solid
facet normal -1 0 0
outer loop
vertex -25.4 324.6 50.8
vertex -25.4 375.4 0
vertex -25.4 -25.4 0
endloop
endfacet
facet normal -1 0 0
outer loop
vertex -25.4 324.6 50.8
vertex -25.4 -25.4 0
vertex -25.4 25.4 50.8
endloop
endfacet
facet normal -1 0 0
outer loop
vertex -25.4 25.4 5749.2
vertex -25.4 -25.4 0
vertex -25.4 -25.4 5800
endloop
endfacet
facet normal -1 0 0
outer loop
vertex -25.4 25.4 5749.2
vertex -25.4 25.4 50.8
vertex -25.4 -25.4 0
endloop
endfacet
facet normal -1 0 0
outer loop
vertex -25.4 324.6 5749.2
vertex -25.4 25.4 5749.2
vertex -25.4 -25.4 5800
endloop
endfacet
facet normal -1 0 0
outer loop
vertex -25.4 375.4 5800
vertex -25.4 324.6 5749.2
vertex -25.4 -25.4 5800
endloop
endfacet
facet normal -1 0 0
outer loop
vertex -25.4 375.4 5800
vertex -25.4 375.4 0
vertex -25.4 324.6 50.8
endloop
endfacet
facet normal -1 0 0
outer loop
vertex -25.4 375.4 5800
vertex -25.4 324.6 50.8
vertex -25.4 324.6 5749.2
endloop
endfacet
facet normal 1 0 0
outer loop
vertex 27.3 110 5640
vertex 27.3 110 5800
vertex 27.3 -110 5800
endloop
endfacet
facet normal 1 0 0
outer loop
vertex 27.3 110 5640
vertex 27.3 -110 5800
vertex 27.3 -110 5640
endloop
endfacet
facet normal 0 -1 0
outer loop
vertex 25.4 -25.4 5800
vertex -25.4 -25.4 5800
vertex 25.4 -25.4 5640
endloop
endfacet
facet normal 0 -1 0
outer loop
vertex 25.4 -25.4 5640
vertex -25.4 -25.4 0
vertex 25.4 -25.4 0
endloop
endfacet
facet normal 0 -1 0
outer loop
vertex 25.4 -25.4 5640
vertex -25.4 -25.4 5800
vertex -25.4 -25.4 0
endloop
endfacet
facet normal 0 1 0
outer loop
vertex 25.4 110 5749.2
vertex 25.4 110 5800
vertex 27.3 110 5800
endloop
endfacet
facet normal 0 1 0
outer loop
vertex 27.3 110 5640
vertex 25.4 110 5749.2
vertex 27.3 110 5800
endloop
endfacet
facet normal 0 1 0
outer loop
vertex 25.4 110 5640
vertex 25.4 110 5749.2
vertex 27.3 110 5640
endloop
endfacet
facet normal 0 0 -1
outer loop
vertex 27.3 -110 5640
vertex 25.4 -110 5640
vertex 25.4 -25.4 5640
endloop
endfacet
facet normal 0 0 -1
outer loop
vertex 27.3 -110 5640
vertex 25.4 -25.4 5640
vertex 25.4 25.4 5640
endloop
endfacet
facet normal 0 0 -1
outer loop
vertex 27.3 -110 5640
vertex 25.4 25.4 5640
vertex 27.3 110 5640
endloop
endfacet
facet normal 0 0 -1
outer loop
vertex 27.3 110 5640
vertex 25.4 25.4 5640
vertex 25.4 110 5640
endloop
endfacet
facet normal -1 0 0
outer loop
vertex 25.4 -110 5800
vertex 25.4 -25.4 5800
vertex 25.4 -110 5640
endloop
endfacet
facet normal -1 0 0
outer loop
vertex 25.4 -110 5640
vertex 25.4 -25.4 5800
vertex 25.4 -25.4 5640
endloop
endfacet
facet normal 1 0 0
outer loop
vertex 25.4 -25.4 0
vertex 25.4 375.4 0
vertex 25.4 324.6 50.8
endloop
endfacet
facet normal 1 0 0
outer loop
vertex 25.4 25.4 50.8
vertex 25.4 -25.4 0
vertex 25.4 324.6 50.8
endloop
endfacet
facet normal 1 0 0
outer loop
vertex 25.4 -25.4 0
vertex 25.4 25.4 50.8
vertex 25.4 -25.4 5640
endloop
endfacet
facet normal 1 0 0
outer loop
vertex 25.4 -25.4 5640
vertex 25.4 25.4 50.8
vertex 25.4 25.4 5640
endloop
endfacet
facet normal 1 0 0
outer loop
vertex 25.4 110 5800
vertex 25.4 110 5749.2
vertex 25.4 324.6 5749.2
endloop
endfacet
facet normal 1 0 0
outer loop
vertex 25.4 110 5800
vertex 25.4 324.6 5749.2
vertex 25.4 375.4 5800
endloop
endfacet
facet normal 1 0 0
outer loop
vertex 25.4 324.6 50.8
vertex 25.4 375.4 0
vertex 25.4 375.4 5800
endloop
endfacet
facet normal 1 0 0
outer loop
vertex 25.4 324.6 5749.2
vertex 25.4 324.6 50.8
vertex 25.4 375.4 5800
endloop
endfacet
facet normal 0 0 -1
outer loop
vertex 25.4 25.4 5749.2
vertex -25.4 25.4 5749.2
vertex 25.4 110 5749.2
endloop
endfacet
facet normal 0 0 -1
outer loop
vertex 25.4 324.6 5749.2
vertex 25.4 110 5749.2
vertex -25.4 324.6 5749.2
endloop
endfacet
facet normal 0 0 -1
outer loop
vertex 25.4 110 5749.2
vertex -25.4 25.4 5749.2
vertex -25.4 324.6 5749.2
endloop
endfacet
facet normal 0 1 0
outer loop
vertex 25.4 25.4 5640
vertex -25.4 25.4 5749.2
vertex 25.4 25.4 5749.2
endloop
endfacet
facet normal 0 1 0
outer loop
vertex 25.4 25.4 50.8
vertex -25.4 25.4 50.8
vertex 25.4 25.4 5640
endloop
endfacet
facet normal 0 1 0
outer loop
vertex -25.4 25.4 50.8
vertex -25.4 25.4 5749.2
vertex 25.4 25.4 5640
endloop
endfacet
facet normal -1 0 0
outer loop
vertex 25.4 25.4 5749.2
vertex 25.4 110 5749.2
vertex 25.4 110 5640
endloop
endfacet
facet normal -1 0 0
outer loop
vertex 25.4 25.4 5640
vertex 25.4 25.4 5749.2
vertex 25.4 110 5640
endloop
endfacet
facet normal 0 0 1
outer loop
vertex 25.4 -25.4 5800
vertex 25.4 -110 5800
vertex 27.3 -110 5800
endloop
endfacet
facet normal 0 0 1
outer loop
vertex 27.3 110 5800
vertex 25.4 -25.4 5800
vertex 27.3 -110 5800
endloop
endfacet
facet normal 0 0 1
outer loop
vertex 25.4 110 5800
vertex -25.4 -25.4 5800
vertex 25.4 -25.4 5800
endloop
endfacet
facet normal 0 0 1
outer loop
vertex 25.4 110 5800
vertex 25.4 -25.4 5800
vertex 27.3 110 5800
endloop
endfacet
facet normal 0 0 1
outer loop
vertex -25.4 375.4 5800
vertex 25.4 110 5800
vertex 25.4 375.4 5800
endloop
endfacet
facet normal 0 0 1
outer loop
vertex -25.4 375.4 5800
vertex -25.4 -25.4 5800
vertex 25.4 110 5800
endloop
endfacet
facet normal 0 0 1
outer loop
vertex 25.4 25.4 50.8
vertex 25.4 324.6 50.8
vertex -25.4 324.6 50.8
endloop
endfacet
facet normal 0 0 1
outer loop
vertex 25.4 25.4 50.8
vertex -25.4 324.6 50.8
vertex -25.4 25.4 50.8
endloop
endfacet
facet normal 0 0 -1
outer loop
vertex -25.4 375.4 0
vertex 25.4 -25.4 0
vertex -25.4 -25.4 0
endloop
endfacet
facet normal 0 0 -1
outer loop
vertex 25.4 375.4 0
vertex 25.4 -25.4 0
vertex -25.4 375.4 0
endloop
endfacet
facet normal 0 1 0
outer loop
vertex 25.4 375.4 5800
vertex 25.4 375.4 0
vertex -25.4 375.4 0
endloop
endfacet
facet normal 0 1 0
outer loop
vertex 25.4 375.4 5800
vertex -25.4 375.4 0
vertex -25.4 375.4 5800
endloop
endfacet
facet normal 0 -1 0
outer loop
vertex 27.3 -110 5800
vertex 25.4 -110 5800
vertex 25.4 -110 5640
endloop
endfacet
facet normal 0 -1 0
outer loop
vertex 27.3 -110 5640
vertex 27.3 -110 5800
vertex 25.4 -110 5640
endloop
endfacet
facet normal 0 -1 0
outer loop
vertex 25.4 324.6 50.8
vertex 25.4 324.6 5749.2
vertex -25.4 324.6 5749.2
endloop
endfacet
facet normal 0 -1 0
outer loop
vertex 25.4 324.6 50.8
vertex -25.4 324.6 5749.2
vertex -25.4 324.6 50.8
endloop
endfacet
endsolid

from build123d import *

# Parameters (mm, degrees)
CROQUIS1_W              = 50.8
CROQUIS1_H              = 50.8
SALIENTE_EXTRUIR1_DEPTH = 5800
CROQUIS4_W              = 160
CROQUIS4_H              = 220
SALIENTE_EXTRUIR4_DEPTH = 1.9
SALIENTE_EXTRUIR5_DEPTH = 50.8
CROQUIS7_W              = 50.8
CROQUIS7_H              = 299.2
SALIENTE_EXTRUIR7_DEPTH = 50.8


with BuildPart() as part:
    # Croquis1 → Saliente-Extruir1 (new body)
    with BuildSketch(Plane.XY):
        Rectangle(CROQUIS1_W, CROQUIS1_H)
    extrude(amount=SALIENTE_EXTRUIR1_DEPTH)

    # Croquis4 → Saliente-Extruir4 (add)
    with BuildSketch(Plane(origin=(25.4, 0, 0), x_dir=(0, 0, -1), z_dir=(1, 0, 0))):
        with Locations((-5720, 0)):
            Rectangle(CROQUIS4_W, CROQUIS4_H)
    extrude(amount=SALIENTE_EXTRUIR4_DEPTH)

    # Croquis5 → Saliente-Extruir5 (add)
    with BuildSketch(Plane(origin=(25.4, 0, 0), x_dir=(0, 0, -1), z_dir=(1, 0, 0))):
        Polygon((0, 25.4), (0, 375.4), (-5800, 375.4), (-5800, 324.6), (-50.8, 324.6), (-50.8, 25.4), align=None)
    extrude(amount=-SALIENTE_EXTRUIR5_DEPTH)

    # Croquis7 → Saliente-Extruir7 (add)
    with BuildSketch(Plane.ZY.offset(25.4)):
        with Locations((5774.6, 175)):
            Rectangle(CROQUIS7_W, CROQUIS7_H)
    extrude(amount=-SALIENTE_EXTRUIR7_DEPTH)


solid = part.part
